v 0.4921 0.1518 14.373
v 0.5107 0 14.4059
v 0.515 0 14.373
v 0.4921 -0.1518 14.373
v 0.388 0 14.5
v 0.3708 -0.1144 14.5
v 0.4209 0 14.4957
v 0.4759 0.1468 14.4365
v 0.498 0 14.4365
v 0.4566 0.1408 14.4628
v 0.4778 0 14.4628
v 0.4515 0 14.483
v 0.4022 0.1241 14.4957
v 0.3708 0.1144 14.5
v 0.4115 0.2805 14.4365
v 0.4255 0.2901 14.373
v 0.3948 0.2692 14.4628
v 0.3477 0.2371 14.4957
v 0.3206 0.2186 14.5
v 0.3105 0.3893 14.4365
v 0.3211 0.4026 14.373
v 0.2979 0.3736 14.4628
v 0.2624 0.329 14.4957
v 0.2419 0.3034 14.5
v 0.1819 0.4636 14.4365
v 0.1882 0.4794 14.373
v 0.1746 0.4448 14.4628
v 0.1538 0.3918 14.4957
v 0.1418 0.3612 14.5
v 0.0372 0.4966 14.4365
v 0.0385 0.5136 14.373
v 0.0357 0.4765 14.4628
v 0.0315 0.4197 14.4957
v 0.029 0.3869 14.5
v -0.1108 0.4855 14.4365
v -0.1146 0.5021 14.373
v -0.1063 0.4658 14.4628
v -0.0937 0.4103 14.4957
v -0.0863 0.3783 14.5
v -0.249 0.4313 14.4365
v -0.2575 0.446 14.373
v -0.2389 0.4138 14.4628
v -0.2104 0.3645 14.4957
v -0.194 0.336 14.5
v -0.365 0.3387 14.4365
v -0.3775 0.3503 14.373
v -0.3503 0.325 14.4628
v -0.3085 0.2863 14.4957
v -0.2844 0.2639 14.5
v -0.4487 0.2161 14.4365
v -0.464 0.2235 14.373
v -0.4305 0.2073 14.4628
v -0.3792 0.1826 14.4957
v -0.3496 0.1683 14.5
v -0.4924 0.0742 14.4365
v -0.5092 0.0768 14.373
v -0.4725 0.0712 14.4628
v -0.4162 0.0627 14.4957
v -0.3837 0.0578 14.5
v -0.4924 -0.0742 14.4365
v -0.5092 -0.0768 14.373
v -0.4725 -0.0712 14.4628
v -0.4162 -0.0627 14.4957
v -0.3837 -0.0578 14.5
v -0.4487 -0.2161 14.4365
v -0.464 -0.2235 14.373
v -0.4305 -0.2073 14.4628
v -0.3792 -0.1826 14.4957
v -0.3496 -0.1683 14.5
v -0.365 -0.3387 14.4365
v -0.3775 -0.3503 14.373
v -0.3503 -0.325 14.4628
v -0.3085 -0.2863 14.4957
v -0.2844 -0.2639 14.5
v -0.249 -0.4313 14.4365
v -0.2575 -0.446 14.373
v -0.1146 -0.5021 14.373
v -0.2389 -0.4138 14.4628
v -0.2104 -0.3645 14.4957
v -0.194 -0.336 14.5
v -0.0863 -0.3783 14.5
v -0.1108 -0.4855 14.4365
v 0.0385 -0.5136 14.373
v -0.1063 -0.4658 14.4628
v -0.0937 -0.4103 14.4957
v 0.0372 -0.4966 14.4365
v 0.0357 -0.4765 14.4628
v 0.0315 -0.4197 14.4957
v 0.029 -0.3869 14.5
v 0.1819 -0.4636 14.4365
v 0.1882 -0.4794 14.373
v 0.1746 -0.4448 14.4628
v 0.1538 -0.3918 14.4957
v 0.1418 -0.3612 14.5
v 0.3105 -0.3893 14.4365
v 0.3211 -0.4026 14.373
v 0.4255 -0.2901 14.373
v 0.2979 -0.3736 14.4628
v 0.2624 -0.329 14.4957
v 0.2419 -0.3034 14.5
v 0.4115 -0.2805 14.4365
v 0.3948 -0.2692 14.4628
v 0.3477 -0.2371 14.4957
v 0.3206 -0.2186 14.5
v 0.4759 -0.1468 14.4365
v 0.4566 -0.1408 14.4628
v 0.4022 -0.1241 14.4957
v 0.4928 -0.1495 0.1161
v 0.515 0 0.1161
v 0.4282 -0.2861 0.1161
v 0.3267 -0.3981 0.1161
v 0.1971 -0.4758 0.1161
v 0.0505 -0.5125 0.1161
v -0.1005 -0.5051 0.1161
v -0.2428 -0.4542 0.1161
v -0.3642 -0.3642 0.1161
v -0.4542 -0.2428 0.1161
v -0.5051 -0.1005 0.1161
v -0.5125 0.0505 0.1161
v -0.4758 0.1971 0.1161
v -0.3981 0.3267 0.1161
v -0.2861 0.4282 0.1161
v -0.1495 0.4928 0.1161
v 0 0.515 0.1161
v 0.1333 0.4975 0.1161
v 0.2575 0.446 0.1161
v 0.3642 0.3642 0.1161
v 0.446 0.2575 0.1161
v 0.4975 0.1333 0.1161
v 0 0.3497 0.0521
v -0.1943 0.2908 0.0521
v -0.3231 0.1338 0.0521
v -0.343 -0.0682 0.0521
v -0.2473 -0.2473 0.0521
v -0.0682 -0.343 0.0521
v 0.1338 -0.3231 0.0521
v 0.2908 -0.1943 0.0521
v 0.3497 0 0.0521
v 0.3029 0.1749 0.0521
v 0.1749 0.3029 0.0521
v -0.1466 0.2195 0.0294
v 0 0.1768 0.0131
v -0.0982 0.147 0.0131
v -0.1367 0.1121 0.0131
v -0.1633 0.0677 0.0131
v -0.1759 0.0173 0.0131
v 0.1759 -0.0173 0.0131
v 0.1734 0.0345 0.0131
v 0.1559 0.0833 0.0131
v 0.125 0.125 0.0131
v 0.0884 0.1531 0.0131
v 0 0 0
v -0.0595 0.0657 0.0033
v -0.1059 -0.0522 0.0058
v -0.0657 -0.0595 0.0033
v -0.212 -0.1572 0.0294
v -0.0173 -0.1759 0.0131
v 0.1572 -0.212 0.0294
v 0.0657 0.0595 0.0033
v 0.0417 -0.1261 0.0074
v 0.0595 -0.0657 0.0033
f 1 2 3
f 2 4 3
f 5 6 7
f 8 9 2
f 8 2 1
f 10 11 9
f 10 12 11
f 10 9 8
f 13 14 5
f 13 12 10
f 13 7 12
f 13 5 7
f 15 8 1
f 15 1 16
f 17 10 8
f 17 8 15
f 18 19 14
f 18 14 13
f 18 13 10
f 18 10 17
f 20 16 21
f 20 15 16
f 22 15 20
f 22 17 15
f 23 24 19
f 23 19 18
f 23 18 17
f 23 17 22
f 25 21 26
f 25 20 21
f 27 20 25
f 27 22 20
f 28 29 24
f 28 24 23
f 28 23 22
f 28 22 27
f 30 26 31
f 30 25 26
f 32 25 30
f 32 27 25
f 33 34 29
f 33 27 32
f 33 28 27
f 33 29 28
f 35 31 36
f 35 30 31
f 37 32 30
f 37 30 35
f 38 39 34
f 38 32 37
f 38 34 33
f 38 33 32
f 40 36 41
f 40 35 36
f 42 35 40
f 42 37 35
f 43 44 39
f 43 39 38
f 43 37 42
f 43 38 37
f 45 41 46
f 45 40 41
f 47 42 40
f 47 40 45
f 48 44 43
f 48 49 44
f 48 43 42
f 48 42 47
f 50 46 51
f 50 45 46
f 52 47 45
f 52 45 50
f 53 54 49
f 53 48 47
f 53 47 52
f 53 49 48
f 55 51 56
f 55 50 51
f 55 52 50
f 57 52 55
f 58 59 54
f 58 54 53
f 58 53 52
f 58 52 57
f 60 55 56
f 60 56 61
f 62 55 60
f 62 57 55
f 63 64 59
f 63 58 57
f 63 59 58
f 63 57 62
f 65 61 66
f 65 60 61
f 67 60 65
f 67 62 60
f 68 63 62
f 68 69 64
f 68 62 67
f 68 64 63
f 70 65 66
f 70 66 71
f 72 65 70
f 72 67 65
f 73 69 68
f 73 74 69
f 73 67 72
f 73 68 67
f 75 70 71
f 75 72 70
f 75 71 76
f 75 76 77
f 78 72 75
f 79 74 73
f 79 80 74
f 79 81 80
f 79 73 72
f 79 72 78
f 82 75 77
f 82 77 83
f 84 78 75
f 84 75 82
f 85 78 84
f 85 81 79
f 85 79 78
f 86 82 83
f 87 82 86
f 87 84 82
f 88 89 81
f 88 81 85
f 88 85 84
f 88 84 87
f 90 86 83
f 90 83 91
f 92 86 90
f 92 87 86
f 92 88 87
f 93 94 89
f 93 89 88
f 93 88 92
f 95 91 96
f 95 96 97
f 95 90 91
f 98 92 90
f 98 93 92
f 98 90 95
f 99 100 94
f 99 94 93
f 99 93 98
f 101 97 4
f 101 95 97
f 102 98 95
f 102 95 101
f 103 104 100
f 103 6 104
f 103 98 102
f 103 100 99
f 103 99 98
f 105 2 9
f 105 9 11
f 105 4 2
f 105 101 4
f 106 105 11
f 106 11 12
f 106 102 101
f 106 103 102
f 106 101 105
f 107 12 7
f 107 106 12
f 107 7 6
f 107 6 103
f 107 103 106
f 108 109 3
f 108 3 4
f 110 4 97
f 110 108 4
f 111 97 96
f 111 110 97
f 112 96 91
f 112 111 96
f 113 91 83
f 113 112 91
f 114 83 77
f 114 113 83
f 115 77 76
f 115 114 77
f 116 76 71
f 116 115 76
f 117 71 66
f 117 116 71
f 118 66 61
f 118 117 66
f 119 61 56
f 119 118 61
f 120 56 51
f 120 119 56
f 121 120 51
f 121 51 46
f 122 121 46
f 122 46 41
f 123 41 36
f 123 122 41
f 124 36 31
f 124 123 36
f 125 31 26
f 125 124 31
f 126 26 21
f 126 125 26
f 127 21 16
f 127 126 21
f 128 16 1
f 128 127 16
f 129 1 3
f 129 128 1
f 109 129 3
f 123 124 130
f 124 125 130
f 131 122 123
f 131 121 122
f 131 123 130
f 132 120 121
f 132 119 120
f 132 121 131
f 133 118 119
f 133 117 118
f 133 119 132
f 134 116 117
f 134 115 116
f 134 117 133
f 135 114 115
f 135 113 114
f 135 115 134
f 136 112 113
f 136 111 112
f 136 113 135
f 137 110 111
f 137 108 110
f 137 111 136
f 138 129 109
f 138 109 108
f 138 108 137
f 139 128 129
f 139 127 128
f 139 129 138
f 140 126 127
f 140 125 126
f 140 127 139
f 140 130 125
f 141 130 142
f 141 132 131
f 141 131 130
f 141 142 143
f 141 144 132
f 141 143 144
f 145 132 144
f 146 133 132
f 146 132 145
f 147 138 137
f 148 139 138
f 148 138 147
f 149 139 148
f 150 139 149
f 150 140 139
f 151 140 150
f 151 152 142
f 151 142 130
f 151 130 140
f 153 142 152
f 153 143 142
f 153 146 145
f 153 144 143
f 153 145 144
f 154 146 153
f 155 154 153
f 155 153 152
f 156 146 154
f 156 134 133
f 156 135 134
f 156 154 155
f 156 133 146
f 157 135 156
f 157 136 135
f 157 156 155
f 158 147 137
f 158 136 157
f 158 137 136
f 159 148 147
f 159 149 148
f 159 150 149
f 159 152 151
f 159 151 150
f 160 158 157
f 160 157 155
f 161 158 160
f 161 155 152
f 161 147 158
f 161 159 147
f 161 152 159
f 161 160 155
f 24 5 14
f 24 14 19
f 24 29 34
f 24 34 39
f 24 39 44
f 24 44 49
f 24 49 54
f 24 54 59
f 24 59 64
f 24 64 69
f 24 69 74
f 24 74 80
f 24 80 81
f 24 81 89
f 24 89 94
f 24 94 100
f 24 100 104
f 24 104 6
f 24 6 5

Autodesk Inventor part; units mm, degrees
ref_plane "YZ Plane" through (0, 0, 0) normal (1, 0, 0) x (0, 1, 0)
ref_plane "XZ Plane" through (0, 0, 0) normal (0, 1, 0) x (-1, 0, 0)
sketch "Sketch1" plane through (0, 0, 0) normal (0, 0, 1) x (1, 0, 0)
  circle A0 centre (0, 0) radius 0.515
  dimension "d0" = 1.03
extrude "Extrusion1" add sketch "Sketch1" along normal blind 14.5
thread "Thread1" size "110-102 UNM" class "2A" standard "ANSI Unified Screw Threads" full length
sketch "Sketch2" plane through (0, 0, 0) normal (1, 0, 0) x (0, 1, 0)
  line L0 (-0.515, 14.5) -> (0.515, 14.5) projected
  line L1 (-0.515, 0) -> (-0.515, 14.5) projected
  line L2 (0.515, 0) -> (0.515, 14.5) projected
  arc A0 (0, 0) -> (0.515, 0.1161) centre (0, 1.2) ccw
  line L3 (-0.515, 0) -> (0.515, 0) projected
  line L4 (0.515, 0.1161) -> (0.515, 0)
  line L5 (0, 0) -> (0.515, 0)
  line L6 (0, -2.7344) -> (0, 16.2057) projected
  point P0 (0, 0)
  point P1 (0, 0)
revolve "Revolution1" cut sketch "Sketch2" angle 360 about axis through (0, 0, -10) along (0, 0, 1) contours A0 L2 L3
ref_plane "Work Plane3" through (0, 0, 7.25) normal (0, 0, 1) x (1, 0, 0)
mirror "Mirror1" [suppressed]
ref_plane "Work Plane4" through (0, 0, 14.5) normal (0, 0, 1) x (1, 0, 0)
fillet "Fillet1" radius 0.127 1 edges at (-0.515, 0, 14.5)
equation "\"d10\" = 0.5 * d1"
equation "\"d11\" = d1"
equation "\"d1\" = 14.5"
properties part number "MU_Motor_Thread_cutting" material "Brass, Soft Yellow"
